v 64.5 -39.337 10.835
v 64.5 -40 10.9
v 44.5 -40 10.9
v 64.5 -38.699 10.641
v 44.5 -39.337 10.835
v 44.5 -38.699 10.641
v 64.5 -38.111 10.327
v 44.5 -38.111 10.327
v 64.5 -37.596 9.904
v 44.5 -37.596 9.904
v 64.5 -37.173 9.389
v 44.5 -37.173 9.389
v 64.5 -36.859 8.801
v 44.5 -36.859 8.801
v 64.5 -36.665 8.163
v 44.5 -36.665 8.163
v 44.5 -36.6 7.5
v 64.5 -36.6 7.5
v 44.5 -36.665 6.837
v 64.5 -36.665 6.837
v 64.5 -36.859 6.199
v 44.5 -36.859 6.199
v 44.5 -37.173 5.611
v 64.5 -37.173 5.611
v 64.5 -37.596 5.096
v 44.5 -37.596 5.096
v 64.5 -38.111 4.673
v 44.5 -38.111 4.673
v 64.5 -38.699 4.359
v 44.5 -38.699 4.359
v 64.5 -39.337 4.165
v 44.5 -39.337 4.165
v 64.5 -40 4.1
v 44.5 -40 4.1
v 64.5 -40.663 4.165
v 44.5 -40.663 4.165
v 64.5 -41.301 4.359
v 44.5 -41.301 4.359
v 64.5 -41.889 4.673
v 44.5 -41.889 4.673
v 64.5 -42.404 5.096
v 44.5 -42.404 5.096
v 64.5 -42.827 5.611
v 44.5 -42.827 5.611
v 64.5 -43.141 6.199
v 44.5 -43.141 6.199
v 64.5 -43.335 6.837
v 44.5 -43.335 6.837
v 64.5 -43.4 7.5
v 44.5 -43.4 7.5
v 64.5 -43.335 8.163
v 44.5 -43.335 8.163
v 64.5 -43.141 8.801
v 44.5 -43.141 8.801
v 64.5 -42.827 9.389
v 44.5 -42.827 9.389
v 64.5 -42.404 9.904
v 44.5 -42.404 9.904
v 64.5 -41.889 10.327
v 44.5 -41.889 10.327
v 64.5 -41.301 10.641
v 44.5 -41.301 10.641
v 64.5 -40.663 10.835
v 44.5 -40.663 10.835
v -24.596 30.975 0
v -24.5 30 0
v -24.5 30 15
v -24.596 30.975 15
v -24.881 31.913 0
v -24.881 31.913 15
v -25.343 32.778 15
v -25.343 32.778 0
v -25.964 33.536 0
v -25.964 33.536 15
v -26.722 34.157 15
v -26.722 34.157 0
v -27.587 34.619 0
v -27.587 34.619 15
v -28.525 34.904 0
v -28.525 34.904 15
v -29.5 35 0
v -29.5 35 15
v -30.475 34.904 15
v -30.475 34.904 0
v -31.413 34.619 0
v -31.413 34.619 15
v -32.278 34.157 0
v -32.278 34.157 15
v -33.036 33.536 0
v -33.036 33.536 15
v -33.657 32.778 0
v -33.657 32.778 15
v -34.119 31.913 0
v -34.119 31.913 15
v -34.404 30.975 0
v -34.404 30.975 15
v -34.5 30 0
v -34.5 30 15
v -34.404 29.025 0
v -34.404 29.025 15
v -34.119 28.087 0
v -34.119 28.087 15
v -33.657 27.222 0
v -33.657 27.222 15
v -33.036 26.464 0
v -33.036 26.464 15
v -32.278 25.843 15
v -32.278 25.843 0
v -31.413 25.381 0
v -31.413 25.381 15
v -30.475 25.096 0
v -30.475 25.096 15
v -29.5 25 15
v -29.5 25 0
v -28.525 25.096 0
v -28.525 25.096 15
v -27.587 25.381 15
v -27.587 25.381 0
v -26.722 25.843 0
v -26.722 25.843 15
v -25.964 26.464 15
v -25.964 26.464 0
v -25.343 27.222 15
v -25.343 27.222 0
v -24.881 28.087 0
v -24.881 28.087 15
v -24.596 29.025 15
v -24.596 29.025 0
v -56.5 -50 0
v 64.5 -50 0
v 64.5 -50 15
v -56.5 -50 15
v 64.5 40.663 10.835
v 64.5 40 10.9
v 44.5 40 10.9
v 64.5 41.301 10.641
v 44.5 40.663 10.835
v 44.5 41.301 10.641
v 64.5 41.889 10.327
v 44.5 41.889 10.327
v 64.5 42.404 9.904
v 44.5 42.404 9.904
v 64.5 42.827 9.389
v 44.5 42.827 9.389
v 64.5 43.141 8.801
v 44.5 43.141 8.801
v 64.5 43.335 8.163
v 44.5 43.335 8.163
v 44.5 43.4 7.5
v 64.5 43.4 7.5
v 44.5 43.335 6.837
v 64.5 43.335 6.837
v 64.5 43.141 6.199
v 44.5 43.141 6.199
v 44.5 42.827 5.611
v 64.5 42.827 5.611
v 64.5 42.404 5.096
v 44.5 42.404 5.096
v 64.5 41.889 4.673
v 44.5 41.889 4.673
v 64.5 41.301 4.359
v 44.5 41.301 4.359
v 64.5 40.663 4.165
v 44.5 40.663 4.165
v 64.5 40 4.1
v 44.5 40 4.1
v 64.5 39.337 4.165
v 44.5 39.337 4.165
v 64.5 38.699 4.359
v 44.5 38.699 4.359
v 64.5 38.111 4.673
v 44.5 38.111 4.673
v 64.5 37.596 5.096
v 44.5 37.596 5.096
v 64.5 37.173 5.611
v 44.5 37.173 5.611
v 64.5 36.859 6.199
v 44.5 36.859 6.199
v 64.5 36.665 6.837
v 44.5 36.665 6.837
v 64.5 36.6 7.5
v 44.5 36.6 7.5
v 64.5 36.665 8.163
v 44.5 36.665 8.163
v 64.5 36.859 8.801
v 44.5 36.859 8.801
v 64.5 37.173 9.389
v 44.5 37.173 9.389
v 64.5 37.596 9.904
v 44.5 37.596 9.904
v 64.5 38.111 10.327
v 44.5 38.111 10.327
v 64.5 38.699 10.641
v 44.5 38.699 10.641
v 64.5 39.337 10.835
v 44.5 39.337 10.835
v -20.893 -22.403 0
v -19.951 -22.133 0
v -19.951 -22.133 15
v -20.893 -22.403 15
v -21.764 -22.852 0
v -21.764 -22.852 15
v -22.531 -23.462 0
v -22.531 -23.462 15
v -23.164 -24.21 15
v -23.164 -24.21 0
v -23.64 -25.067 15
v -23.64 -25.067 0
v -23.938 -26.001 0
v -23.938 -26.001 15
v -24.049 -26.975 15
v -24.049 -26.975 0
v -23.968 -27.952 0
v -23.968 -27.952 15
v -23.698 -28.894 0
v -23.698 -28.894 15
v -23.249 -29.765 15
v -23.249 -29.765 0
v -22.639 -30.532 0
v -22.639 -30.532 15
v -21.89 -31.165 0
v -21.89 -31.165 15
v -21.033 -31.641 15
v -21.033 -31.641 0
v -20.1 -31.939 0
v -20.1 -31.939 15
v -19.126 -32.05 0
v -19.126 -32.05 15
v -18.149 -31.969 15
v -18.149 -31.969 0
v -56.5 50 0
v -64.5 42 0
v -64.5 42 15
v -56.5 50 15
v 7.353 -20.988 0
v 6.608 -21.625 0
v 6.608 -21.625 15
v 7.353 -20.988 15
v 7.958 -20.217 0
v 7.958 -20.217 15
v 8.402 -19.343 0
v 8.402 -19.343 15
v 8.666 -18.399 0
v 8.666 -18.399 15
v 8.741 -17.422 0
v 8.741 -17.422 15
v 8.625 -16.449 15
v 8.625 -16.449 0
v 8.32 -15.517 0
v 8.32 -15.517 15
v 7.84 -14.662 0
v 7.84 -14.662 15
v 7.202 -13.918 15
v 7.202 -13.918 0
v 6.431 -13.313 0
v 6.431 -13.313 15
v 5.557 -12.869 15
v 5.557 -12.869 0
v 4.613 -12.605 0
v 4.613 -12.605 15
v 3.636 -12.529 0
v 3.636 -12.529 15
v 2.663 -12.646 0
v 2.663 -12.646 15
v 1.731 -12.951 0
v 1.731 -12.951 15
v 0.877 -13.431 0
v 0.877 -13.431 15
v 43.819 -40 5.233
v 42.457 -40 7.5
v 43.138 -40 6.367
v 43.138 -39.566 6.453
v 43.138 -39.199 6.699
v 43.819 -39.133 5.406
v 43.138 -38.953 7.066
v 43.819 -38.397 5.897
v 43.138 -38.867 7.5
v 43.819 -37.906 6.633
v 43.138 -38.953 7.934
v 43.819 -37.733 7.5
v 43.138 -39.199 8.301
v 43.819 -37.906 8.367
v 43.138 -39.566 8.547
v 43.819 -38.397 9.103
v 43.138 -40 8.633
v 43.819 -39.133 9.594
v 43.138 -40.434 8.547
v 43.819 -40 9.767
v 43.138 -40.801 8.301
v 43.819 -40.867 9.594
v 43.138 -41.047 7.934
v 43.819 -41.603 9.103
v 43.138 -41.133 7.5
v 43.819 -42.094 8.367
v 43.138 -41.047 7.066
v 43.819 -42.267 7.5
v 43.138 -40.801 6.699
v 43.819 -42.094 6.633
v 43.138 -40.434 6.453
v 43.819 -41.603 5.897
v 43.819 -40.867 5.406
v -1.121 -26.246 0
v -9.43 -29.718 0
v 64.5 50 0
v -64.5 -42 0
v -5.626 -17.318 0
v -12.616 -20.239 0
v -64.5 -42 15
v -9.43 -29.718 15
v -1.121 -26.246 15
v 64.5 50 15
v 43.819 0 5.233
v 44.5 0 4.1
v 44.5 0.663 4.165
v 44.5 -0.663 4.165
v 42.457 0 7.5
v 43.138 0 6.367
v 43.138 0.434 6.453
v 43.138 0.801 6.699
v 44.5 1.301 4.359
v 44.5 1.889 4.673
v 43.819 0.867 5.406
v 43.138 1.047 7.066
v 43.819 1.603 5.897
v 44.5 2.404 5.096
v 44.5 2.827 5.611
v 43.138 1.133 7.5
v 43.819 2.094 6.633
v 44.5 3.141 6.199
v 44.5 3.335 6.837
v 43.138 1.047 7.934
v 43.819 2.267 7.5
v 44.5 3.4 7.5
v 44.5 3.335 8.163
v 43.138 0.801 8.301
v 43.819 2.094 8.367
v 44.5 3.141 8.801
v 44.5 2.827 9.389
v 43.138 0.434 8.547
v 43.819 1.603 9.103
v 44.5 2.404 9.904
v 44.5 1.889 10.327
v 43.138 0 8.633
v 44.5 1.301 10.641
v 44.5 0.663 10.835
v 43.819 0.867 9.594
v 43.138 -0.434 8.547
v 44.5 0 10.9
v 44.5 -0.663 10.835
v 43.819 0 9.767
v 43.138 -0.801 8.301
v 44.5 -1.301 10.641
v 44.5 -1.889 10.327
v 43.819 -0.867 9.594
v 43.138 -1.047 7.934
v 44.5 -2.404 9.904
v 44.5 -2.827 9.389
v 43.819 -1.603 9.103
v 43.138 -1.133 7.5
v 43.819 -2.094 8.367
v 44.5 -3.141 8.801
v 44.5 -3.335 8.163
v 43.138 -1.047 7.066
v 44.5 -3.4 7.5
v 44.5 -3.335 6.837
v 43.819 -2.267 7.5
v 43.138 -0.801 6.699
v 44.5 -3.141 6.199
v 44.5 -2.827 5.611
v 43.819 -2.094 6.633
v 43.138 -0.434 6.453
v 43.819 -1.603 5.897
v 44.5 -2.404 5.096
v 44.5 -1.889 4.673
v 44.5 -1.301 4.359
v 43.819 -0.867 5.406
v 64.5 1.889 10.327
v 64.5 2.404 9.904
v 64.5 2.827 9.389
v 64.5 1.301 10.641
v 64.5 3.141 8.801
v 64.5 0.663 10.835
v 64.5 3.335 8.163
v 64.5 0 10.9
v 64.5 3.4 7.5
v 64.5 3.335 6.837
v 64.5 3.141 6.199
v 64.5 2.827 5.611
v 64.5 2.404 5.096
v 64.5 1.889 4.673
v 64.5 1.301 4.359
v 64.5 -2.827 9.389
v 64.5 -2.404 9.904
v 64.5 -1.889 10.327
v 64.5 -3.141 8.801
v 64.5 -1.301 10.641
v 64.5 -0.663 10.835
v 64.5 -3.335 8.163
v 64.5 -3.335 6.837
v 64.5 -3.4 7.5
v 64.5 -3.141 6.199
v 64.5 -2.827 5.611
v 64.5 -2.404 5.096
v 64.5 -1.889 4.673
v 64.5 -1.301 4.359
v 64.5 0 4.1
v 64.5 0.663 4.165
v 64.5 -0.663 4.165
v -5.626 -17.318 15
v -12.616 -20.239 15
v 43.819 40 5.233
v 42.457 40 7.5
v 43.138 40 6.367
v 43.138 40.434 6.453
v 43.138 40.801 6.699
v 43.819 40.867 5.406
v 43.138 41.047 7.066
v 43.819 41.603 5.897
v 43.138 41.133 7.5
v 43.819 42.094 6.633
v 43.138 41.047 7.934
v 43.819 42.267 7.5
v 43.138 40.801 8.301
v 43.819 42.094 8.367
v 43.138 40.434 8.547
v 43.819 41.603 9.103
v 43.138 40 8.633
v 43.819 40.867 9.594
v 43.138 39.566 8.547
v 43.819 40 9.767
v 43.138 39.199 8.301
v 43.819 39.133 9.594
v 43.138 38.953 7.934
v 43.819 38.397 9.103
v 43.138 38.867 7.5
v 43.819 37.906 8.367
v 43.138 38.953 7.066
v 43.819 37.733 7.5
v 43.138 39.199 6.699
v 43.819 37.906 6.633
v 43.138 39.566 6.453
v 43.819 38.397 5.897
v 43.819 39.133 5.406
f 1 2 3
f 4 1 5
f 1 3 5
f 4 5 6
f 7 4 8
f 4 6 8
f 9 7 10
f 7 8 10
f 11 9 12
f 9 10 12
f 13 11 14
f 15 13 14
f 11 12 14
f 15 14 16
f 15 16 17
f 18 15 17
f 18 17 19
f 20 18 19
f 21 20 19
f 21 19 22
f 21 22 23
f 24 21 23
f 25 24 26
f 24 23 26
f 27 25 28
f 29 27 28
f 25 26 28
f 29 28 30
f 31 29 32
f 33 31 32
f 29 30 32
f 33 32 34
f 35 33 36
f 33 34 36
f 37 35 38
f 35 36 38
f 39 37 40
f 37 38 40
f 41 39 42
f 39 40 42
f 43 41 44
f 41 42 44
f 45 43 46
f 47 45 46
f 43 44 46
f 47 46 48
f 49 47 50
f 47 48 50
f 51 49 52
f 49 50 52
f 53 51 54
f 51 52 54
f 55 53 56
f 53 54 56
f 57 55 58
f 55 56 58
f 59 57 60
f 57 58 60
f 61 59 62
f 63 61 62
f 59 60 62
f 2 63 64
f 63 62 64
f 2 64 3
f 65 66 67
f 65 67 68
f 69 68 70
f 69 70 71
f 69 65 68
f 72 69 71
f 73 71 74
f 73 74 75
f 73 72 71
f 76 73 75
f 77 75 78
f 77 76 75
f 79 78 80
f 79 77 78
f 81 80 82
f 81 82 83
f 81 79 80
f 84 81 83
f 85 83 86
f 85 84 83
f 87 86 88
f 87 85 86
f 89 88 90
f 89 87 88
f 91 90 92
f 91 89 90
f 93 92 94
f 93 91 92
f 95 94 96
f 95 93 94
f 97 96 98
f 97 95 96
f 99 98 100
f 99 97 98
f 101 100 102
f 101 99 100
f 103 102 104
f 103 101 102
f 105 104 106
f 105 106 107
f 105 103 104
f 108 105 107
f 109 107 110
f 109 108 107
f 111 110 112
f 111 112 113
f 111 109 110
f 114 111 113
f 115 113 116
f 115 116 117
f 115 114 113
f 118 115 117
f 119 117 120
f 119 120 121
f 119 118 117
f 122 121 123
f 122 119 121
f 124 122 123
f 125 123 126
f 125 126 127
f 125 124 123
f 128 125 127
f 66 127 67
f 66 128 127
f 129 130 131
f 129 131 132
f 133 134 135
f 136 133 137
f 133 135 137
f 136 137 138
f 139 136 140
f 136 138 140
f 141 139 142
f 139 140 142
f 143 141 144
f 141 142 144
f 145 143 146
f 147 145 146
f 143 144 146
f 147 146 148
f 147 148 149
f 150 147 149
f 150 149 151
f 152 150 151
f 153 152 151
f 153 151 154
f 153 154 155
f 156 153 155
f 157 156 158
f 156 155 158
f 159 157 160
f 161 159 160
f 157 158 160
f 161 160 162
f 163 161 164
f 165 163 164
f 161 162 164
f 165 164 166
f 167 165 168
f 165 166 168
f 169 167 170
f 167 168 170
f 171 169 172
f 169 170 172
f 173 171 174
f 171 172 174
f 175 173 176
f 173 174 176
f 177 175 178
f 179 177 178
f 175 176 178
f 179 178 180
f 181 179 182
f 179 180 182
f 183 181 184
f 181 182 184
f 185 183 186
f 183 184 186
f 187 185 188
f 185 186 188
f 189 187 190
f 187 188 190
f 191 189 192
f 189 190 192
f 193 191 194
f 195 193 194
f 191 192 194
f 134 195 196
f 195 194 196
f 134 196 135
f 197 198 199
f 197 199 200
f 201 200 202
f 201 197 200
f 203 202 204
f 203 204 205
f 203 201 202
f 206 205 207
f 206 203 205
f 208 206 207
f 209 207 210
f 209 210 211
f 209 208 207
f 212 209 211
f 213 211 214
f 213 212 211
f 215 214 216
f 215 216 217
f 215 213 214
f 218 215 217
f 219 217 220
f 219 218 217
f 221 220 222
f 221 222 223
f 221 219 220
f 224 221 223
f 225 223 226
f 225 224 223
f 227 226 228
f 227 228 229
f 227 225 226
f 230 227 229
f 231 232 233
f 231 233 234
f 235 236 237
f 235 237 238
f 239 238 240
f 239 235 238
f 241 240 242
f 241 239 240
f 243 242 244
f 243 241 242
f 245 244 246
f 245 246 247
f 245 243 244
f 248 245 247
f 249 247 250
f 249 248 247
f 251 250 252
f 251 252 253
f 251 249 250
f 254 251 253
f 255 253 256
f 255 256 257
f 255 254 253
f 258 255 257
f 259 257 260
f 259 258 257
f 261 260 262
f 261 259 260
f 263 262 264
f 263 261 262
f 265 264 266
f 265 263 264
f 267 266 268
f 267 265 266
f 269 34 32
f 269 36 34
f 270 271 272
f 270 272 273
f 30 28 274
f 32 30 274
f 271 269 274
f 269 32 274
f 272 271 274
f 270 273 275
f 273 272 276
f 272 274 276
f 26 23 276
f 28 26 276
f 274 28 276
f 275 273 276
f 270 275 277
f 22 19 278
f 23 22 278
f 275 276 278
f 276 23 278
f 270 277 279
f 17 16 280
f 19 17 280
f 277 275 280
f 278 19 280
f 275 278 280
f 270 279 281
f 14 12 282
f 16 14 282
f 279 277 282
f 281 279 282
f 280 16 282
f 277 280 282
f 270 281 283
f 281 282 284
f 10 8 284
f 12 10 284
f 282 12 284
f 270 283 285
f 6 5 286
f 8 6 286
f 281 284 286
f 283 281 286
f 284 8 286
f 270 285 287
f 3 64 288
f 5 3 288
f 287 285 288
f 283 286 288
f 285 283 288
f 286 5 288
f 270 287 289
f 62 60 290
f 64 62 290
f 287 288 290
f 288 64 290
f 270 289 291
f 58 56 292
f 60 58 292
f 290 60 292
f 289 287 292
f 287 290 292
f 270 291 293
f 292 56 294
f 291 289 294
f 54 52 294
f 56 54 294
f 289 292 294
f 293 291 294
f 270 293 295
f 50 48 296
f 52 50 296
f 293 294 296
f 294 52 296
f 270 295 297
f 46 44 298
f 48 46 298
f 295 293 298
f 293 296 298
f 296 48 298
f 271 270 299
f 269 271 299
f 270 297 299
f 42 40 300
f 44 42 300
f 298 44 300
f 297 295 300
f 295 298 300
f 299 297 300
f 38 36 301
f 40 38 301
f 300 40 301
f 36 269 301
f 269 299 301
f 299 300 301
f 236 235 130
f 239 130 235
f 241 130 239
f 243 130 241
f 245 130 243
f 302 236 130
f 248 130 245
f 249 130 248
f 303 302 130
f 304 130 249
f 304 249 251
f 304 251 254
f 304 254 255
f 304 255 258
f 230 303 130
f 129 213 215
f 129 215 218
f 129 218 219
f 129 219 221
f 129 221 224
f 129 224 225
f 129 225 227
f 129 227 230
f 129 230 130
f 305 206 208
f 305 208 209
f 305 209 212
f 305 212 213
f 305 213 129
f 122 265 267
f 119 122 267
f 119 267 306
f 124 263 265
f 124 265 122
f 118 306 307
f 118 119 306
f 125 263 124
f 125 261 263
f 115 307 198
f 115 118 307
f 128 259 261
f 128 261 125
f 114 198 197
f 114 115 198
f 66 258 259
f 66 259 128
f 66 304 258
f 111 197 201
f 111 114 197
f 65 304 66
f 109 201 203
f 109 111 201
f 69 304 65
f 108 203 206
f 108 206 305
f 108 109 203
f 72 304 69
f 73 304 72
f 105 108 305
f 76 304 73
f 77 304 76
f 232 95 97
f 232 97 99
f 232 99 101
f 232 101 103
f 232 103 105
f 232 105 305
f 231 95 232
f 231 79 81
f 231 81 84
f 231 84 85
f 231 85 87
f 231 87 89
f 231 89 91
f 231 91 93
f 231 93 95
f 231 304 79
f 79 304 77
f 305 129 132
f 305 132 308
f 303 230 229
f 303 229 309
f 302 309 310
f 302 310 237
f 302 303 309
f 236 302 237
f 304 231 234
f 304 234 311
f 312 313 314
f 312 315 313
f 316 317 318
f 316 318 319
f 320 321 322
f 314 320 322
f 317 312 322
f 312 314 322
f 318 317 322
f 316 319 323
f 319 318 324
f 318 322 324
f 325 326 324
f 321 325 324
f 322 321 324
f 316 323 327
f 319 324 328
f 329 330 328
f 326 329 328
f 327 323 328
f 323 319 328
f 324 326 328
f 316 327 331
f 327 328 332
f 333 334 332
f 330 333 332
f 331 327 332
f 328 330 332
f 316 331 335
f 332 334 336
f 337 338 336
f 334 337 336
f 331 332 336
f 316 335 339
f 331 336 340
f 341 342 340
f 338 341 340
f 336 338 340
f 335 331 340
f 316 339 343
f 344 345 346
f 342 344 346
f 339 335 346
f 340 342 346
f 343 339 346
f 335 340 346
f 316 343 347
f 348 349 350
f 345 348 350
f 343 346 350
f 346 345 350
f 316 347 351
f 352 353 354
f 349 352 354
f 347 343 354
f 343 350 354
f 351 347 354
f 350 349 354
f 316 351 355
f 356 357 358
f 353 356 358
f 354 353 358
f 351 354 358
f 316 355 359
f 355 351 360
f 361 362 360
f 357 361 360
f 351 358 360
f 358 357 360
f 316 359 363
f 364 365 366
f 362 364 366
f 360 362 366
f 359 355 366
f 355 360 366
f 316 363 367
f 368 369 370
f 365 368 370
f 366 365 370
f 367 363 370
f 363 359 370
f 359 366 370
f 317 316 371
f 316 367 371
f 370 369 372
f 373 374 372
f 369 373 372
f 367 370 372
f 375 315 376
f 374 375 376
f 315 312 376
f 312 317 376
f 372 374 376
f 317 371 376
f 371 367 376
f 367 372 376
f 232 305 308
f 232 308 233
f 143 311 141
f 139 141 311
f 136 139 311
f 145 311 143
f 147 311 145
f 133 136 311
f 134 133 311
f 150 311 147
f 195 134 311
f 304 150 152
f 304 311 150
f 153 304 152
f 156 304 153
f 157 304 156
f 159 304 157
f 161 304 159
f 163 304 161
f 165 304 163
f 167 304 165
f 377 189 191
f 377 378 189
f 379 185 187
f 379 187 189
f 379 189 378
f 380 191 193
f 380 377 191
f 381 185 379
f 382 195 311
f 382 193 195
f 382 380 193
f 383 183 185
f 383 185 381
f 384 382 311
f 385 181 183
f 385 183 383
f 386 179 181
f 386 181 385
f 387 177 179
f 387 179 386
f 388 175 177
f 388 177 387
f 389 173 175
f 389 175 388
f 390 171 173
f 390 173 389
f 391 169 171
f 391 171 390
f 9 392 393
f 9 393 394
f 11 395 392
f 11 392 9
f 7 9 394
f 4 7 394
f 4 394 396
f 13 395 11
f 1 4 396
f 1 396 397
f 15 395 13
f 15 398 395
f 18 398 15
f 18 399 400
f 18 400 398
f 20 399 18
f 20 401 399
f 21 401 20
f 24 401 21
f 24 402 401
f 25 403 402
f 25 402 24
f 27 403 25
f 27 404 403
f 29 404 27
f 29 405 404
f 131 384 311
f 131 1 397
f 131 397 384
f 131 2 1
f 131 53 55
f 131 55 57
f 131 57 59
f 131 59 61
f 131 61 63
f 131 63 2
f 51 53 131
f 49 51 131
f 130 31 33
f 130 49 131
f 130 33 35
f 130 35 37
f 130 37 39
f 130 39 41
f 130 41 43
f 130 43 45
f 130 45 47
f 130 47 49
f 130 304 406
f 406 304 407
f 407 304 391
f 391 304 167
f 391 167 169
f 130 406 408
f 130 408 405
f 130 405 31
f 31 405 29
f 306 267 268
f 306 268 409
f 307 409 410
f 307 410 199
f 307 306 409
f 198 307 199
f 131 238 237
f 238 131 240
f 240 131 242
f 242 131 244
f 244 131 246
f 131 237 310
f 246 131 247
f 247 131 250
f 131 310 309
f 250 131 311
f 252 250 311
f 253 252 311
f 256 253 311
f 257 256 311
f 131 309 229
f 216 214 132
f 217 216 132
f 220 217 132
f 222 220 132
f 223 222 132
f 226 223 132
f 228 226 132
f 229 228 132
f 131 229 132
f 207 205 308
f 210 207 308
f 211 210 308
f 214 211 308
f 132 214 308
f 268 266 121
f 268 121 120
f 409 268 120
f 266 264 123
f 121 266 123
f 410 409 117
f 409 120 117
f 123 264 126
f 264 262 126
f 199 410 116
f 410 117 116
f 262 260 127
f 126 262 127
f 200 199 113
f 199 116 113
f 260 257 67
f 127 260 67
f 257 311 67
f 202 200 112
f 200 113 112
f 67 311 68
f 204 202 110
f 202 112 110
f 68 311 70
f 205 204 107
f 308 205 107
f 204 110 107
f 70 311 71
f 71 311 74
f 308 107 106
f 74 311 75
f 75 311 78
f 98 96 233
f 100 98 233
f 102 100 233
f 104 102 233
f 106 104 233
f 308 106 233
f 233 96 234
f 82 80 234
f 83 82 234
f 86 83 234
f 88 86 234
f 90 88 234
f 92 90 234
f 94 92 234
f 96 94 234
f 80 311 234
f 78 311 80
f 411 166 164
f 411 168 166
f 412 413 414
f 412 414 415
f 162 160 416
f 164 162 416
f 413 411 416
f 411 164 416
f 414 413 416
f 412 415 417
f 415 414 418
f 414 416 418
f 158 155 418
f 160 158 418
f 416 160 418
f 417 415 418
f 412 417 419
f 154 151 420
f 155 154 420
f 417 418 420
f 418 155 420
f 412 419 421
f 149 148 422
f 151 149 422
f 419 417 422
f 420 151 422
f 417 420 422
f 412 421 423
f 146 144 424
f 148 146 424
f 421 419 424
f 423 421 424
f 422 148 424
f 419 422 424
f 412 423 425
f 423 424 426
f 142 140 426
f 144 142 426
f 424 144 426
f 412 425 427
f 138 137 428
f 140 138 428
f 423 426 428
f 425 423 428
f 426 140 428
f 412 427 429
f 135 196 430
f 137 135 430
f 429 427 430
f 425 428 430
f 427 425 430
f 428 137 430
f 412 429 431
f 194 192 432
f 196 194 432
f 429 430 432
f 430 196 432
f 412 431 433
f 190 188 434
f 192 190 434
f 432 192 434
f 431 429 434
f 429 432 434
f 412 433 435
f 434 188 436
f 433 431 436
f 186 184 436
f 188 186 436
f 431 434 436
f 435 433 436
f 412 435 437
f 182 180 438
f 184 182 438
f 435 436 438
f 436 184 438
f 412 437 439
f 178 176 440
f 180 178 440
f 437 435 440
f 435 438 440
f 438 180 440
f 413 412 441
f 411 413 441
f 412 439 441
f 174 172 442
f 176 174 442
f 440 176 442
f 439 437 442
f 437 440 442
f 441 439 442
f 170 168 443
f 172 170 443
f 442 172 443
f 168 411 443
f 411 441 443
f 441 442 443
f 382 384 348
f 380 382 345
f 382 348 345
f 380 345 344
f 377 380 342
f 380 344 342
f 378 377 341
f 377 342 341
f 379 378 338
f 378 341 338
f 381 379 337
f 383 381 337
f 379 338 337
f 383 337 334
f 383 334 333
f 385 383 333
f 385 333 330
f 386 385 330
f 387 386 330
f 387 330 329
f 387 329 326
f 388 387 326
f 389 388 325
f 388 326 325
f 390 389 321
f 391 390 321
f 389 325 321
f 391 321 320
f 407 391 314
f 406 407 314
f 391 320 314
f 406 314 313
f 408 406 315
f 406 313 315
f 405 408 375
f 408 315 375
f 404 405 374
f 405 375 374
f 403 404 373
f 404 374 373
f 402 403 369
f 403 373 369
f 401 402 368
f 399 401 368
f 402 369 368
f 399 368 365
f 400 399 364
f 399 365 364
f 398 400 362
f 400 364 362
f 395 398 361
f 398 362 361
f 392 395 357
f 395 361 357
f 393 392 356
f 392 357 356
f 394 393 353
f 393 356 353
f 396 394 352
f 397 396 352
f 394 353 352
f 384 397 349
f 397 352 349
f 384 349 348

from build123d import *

# Parameters (mm, degrees)
CROQUIS1_R                = 5
SALIENTE_EXTRUIR1_DEPTH   = 15
TALADRO_ROSCADO_M81_D     = 6.8
TALADRO_ROSCADO_M81_DEPTH = 20
TALADRO_ROSCADO_M81_TIP   = 2.042926105


with BuildPart() as part:
    # Croquis1 → Saliente-Extruir1 (new body)
    with BuildSketch(Plane.XY):
        Polygon((-64.5, 42), (-56.5, 50), (64.5, 50), (64.5, -50), (-56.5, -50), (-64.5, -42), align=None)
        with Locations((-29.5, 30)):
            Circle(CROQUIS1_R, mode=Mode.SUBTRACT)
        with BuildLine():
            ThreePointArc((-18.148924408, -31.968968709), (-5.213281237, -28.130502249), (6.608289397, -21.625492122))
            ThreePointArc((6.608289397, -21.625492122), (7.839813422, -14.662493589), (0.876814889, -13.430969563))
            ThreePointArc((0.876814889, -13.430969563), (-9.068315962, -18.9034384), (-19.950682438, -22.13262447))
            ThreePointArc((-19.950682438, -22.13262447), (-23.967975543, -27.951675605), (-18.148924408, -31.968968709))
        make_face(mode=Mode.SUBTRACT)
    extrude(amount=SALIENTE_EXTRUIR1_DEPTH)

    # Taladro roscado M81
    with Locations(Plane(origin=(64.5, 0, 0), x_dir=(0, 0, -1), z_dir=(1, 0, 0))):
        with Locations((-7.5, 40), (-7.5, 0), (-7.5, -40)):
            Hole(TALADRO_ROSCADO_M81_D / 2, depth=TALADRO_ROSCADO_M81_DEPTH)
            with Locations((0, 0, -(TALADRO_ROSCADO_M81_DEPTH + TALADRO_ROSCADO_M81_TIP / 2))):  # 118° drill point
                Cone(0, TALADRO_ROSCADO_M81_D / 2, TALADRO_ROSCADO_M81_TIP, mode=Mode.SUBTRACT)


solid = part.part
